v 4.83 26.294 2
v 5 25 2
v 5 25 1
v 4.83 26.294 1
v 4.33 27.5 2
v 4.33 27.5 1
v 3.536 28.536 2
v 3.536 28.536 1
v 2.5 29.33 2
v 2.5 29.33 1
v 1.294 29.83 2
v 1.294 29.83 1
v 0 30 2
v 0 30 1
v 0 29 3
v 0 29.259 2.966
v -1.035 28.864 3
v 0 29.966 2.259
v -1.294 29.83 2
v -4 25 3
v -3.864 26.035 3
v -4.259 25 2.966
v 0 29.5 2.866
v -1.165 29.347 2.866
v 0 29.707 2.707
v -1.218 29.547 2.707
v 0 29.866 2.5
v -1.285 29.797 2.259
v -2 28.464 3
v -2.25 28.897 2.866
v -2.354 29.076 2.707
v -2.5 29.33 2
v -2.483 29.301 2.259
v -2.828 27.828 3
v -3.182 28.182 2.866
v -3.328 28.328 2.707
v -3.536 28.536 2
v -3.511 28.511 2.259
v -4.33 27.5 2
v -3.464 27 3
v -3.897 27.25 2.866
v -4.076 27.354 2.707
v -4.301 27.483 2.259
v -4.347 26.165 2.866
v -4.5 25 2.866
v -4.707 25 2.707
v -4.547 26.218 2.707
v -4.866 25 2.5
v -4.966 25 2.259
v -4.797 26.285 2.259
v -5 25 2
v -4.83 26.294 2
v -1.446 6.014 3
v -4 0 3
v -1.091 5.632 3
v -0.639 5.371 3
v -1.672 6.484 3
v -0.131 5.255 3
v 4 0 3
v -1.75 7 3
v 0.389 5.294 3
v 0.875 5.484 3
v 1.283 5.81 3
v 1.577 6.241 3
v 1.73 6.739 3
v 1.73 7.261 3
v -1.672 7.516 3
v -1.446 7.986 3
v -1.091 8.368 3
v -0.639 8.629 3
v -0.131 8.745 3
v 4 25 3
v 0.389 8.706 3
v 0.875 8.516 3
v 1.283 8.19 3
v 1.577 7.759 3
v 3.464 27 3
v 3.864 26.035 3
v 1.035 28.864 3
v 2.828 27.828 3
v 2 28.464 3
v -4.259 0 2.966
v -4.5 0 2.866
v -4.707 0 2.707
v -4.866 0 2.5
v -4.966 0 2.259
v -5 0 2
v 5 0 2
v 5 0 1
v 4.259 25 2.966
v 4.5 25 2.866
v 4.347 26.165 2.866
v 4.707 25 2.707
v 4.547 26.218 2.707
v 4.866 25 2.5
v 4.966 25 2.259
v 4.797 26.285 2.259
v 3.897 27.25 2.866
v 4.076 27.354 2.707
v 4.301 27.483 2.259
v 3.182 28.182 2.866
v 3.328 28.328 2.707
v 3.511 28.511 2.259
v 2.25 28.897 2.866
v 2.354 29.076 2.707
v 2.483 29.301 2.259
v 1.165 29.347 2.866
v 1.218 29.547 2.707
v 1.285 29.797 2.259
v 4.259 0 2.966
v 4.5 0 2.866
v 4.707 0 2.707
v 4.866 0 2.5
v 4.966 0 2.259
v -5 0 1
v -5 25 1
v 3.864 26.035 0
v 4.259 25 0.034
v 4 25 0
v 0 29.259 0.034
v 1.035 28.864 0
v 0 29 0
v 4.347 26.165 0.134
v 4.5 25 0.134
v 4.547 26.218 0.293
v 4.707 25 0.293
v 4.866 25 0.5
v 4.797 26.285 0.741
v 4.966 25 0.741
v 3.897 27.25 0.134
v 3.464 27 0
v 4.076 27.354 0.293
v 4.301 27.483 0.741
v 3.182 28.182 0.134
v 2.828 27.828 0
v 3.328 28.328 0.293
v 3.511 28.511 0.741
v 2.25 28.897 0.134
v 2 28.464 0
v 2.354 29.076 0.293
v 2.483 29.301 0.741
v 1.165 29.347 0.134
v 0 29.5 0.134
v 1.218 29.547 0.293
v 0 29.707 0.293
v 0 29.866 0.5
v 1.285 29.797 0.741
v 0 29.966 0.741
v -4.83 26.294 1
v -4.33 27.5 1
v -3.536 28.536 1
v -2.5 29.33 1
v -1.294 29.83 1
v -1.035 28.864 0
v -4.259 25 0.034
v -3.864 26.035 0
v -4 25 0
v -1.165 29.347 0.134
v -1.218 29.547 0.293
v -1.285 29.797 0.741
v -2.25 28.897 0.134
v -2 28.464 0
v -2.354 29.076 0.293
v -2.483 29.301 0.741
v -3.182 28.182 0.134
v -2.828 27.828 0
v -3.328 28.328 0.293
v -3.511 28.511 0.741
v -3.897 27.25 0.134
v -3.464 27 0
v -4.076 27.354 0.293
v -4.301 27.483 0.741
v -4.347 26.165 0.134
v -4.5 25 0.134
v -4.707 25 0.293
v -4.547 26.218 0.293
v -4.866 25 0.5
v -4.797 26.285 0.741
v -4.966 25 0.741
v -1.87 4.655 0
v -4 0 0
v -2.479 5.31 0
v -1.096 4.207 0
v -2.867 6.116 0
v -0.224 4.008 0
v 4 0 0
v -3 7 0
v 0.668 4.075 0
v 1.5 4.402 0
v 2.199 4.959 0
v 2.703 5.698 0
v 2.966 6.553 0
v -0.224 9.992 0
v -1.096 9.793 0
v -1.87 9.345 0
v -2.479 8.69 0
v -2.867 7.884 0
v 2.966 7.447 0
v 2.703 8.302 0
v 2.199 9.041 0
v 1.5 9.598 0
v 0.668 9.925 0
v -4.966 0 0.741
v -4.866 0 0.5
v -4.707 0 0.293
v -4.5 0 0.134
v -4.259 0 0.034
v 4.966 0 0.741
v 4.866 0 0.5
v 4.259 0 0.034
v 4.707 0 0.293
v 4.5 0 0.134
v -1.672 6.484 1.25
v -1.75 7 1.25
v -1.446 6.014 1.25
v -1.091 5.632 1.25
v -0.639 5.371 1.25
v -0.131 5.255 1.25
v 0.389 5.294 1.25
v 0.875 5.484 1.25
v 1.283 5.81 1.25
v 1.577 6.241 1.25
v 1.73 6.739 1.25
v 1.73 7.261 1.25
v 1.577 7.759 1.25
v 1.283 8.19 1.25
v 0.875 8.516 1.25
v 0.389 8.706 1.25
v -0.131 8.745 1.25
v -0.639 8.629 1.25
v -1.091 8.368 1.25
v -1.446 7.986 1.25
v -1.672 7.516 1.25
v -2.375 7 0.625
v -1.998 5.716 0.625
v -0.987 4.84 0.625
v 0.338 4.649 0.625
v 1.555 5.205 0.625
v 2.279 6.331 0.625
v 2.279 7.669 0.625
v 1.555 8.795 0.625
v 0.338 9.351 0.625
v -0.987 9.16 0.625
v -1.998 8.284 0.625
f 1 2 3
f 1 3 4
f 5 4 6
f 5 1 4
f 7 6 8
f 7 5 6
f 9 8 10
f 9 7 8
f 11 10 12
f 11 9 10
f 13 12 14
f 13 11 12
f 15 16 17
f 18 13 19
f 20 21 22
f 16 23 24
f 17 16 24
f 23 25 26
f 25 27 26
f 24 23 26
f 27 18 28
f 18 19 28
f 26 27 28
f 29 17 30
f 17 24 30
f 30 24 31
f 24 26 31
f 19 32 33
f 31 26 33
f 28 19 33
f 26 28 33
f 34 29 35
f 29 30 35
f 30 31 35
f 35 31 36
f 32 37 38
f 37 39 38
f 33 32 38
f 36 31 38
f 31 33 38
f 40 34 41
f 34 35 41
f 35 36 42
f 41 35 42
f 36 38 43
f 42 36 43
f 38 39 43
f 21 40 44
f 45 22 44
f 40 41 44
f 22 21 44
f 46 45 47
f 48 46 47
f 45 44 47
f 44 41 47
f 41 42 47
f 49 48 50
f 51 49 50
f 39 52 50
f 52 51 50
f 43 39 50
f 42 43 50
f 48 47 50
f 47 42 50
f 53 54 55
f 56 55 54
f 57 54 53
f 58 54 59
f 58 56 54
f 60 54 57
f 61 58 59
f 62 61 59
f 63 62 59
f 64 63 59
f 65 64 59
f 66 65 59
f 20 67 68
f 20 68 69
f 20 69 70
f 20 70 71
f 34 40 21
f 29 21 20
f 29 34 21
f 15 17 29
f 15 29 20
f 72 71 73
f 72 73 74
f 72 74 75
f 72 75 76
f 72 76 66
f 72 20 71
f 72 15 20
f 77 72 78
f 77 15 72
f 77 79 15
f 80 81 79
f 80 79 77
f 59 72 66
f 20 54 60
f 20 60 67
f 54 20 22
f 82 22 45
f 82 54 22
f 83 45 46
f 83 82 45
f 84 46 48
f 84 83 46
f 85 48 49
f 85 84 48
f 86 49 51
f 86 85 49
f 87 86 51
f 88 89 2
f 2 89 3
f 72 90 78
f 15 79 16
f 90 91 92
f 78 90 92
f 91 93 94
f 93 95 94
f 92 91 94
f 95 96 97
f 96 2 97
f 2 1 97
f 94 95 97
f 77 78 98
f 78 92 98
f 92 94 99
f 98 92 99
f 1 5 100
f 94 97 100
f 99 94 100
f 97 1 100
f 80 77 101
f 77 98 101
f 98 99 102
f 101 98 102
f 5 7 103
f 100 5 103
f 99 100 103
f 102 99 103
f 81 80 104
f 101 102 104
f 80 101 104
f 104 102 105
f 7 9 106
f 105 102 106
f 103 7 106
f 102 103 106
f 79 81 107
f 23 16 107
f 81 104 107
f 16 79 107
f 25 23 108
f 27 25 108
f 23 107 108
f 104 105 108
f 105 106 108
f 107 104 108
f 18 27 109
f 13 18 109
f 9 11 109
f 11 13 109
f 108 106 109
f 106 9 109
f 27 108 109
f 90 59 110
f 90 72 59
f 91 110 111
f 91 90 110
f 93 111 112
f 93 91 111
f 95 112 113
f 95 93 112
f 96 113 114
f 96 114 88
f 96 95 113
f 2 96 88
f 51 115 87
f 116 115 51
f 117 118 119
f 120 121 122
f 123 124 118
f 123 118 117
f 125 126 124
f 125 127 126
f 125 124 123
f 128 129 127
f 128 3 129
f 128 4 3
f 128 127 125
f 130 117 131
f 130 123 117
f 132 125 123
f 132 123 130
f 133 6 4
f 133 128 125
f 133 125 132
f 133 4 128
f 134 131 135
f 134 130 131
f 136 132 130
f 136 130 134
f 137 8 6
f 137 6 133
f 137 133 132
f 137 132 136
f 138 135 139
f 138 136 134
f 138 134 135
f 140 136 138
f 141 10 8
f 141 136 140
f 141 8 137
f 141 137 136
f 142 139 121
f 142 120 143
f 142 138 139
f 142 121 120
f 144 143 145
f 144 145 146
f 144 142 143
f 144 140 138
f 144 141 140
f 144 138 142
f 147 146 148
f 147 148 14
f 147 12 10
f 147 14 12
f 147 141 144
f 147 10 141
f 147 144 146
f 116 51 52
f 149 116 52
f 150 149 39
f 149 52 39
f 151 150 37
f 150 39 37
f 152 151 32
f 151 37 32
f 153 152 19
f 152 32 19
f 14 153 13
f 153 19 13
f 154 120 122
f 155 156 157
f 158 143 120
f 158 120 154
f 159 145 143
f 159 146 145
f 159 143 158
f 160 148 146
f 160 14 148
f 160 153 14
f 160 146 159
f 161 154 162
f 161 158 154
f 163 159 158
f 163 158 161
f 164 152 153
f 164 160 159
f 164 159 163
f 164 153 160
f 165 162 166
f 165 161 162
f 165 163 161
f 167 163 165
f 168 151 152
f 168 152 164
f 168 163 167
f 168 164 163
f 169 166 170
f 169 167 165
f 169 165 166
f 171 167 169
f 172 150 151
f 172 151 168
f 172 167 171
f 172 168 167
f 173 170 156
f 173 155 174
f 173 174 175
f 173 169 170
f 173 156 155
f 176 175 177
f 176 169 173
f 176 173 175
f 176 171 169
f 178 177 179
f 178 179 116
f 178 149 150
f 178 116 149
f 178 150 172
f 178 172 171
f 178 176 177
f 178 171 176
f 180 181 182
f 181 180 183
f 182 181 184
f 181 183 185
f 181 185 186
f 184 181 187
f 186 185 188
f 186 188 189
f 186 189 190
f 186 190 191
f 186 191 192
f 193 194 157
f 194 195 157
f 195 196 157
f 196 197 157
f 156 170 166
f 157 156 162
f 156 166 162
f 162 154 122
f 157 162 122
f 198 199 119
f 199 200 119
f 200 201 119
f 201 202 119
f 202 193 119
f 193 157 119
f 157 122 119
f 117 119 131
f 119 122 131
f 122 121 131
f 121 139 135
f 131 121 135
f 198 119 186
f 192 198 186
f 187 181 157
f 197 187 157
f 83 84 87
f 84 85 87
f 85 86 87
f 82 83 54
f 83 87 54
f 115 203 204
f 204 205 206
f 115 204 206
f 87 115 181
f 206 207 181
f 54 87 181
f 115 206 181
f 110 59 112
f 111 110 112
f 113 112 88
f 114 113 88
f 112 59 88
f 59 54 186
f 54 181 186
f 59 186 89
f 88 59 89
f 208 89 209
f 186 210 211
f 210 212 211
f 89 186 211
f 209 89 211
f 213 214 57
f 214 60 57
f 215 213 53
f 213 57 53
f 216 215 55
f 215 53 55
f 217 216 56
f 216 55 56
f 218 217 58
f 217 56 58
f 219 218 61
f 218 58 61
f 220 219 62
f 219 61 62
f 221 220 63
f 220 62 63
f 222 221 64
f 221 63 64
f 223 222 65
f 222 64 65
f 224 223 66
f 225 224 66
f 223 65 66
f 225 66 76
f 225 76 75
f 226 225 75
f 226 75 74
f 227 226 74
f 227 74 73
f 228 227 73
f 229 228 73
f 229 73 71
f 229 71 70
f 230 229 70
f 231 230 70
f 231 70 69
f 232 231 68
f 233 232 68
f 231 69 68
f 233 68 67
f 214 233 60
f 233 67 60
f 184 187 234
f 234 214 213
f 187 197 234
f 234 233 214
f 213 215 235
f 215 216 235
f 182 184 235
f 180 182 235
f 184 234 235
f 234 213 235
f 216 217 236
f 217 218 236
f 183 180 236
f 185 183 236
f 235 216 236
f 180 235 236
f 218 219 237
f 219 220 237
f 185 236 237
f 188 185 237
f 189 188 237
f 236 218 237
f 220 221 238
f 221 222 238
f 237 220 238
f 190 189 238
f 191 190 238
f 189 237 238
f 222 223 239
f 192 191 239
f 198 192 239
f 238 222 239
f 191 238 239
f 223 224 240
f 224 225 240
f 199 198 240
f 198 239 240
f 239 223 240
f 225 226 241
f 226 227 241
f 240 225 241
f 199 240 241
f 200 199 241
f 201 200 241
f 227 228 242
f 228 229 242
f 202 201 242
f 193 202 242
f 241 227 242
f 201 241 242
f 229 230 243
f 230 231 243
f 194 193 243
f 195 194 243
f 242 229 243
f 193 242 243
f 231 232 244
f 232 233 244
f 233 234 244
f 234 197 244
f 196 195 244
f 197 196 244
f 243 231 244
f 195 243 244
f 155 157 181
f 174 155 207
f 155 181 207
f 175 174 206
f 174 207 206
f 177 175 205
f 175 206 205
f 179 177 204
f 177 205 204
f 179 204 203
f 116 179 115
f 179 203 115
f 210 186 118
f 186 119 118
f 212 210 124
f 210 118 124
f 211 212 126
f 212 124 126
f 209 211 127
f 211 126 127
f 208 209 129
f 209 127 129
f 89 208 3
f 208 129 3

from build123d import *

# Parameters (mm, degrees)
F0_W           = 10
F0_H           = 30
F1_DEPTH       = 3
F2_D           = 3.5
F2_DEPTH       = 3
F2_CSINK_D     = 6
F2_CSINK_ANGLE = 90
F2_TIP         = 1.0515060833
F3_R           = 4.99999
F4_R           = 1


# Not quite as in the source:
# - a fillet or chamfer is up to 0.001 mm smaller than in the source, because OpenCascade refuses the exact size


with BuildPart() as f1:
    # F0 (on Top) → F1 (new body)
    with BuildSketch(Plane.XY):
        with Locations((0, 15)):
            Rectangle(F0_W, F0_H)
    extrude(amount=F1_DEPTH)

    # F2
    with Locations(Plane(origin=(0, 0, 0), x_dir=(1, 0, 0), z_dir=(0, 0, -1))):
        with Locations((0, -7)):
            CounterSinkHole(F2_D / 2, F2_CSINK_D / 2, depth=F2_DEPTH, counter_sink_angle=F2_CSINK_ANGLE)
            with Locations((0, 0, -(F2_DEPTH + F2_TIP / 2))):  # 118° drill point
                Cone(0, F2_D / 2, F2_TIP, mode=Mode.SUBTRACT)

    # F3 (radius 5 in the source; OpenCascade refuses exactly that, so slightly less here)
    f3_edges = [f1.edges().sort_by_distance(p)[0] for p in [
        (5, 30, 1.5),
        (-5, 30, 1.5),
    ]]
    fillet(f3_edges, radius=F3_R)

    # F4
    f4_edges = [f1.edges().sort_by_distance(p)[0] for p in [
        (3.535537, 28.535537, 0),
        (3.535537, 28.535537, 3),
        (-5, 12.500005, 3),
        (5, 12.500005, 3),
    ]]
    fillet(f4_edges, radius=F4_R)


solid = f1.part
